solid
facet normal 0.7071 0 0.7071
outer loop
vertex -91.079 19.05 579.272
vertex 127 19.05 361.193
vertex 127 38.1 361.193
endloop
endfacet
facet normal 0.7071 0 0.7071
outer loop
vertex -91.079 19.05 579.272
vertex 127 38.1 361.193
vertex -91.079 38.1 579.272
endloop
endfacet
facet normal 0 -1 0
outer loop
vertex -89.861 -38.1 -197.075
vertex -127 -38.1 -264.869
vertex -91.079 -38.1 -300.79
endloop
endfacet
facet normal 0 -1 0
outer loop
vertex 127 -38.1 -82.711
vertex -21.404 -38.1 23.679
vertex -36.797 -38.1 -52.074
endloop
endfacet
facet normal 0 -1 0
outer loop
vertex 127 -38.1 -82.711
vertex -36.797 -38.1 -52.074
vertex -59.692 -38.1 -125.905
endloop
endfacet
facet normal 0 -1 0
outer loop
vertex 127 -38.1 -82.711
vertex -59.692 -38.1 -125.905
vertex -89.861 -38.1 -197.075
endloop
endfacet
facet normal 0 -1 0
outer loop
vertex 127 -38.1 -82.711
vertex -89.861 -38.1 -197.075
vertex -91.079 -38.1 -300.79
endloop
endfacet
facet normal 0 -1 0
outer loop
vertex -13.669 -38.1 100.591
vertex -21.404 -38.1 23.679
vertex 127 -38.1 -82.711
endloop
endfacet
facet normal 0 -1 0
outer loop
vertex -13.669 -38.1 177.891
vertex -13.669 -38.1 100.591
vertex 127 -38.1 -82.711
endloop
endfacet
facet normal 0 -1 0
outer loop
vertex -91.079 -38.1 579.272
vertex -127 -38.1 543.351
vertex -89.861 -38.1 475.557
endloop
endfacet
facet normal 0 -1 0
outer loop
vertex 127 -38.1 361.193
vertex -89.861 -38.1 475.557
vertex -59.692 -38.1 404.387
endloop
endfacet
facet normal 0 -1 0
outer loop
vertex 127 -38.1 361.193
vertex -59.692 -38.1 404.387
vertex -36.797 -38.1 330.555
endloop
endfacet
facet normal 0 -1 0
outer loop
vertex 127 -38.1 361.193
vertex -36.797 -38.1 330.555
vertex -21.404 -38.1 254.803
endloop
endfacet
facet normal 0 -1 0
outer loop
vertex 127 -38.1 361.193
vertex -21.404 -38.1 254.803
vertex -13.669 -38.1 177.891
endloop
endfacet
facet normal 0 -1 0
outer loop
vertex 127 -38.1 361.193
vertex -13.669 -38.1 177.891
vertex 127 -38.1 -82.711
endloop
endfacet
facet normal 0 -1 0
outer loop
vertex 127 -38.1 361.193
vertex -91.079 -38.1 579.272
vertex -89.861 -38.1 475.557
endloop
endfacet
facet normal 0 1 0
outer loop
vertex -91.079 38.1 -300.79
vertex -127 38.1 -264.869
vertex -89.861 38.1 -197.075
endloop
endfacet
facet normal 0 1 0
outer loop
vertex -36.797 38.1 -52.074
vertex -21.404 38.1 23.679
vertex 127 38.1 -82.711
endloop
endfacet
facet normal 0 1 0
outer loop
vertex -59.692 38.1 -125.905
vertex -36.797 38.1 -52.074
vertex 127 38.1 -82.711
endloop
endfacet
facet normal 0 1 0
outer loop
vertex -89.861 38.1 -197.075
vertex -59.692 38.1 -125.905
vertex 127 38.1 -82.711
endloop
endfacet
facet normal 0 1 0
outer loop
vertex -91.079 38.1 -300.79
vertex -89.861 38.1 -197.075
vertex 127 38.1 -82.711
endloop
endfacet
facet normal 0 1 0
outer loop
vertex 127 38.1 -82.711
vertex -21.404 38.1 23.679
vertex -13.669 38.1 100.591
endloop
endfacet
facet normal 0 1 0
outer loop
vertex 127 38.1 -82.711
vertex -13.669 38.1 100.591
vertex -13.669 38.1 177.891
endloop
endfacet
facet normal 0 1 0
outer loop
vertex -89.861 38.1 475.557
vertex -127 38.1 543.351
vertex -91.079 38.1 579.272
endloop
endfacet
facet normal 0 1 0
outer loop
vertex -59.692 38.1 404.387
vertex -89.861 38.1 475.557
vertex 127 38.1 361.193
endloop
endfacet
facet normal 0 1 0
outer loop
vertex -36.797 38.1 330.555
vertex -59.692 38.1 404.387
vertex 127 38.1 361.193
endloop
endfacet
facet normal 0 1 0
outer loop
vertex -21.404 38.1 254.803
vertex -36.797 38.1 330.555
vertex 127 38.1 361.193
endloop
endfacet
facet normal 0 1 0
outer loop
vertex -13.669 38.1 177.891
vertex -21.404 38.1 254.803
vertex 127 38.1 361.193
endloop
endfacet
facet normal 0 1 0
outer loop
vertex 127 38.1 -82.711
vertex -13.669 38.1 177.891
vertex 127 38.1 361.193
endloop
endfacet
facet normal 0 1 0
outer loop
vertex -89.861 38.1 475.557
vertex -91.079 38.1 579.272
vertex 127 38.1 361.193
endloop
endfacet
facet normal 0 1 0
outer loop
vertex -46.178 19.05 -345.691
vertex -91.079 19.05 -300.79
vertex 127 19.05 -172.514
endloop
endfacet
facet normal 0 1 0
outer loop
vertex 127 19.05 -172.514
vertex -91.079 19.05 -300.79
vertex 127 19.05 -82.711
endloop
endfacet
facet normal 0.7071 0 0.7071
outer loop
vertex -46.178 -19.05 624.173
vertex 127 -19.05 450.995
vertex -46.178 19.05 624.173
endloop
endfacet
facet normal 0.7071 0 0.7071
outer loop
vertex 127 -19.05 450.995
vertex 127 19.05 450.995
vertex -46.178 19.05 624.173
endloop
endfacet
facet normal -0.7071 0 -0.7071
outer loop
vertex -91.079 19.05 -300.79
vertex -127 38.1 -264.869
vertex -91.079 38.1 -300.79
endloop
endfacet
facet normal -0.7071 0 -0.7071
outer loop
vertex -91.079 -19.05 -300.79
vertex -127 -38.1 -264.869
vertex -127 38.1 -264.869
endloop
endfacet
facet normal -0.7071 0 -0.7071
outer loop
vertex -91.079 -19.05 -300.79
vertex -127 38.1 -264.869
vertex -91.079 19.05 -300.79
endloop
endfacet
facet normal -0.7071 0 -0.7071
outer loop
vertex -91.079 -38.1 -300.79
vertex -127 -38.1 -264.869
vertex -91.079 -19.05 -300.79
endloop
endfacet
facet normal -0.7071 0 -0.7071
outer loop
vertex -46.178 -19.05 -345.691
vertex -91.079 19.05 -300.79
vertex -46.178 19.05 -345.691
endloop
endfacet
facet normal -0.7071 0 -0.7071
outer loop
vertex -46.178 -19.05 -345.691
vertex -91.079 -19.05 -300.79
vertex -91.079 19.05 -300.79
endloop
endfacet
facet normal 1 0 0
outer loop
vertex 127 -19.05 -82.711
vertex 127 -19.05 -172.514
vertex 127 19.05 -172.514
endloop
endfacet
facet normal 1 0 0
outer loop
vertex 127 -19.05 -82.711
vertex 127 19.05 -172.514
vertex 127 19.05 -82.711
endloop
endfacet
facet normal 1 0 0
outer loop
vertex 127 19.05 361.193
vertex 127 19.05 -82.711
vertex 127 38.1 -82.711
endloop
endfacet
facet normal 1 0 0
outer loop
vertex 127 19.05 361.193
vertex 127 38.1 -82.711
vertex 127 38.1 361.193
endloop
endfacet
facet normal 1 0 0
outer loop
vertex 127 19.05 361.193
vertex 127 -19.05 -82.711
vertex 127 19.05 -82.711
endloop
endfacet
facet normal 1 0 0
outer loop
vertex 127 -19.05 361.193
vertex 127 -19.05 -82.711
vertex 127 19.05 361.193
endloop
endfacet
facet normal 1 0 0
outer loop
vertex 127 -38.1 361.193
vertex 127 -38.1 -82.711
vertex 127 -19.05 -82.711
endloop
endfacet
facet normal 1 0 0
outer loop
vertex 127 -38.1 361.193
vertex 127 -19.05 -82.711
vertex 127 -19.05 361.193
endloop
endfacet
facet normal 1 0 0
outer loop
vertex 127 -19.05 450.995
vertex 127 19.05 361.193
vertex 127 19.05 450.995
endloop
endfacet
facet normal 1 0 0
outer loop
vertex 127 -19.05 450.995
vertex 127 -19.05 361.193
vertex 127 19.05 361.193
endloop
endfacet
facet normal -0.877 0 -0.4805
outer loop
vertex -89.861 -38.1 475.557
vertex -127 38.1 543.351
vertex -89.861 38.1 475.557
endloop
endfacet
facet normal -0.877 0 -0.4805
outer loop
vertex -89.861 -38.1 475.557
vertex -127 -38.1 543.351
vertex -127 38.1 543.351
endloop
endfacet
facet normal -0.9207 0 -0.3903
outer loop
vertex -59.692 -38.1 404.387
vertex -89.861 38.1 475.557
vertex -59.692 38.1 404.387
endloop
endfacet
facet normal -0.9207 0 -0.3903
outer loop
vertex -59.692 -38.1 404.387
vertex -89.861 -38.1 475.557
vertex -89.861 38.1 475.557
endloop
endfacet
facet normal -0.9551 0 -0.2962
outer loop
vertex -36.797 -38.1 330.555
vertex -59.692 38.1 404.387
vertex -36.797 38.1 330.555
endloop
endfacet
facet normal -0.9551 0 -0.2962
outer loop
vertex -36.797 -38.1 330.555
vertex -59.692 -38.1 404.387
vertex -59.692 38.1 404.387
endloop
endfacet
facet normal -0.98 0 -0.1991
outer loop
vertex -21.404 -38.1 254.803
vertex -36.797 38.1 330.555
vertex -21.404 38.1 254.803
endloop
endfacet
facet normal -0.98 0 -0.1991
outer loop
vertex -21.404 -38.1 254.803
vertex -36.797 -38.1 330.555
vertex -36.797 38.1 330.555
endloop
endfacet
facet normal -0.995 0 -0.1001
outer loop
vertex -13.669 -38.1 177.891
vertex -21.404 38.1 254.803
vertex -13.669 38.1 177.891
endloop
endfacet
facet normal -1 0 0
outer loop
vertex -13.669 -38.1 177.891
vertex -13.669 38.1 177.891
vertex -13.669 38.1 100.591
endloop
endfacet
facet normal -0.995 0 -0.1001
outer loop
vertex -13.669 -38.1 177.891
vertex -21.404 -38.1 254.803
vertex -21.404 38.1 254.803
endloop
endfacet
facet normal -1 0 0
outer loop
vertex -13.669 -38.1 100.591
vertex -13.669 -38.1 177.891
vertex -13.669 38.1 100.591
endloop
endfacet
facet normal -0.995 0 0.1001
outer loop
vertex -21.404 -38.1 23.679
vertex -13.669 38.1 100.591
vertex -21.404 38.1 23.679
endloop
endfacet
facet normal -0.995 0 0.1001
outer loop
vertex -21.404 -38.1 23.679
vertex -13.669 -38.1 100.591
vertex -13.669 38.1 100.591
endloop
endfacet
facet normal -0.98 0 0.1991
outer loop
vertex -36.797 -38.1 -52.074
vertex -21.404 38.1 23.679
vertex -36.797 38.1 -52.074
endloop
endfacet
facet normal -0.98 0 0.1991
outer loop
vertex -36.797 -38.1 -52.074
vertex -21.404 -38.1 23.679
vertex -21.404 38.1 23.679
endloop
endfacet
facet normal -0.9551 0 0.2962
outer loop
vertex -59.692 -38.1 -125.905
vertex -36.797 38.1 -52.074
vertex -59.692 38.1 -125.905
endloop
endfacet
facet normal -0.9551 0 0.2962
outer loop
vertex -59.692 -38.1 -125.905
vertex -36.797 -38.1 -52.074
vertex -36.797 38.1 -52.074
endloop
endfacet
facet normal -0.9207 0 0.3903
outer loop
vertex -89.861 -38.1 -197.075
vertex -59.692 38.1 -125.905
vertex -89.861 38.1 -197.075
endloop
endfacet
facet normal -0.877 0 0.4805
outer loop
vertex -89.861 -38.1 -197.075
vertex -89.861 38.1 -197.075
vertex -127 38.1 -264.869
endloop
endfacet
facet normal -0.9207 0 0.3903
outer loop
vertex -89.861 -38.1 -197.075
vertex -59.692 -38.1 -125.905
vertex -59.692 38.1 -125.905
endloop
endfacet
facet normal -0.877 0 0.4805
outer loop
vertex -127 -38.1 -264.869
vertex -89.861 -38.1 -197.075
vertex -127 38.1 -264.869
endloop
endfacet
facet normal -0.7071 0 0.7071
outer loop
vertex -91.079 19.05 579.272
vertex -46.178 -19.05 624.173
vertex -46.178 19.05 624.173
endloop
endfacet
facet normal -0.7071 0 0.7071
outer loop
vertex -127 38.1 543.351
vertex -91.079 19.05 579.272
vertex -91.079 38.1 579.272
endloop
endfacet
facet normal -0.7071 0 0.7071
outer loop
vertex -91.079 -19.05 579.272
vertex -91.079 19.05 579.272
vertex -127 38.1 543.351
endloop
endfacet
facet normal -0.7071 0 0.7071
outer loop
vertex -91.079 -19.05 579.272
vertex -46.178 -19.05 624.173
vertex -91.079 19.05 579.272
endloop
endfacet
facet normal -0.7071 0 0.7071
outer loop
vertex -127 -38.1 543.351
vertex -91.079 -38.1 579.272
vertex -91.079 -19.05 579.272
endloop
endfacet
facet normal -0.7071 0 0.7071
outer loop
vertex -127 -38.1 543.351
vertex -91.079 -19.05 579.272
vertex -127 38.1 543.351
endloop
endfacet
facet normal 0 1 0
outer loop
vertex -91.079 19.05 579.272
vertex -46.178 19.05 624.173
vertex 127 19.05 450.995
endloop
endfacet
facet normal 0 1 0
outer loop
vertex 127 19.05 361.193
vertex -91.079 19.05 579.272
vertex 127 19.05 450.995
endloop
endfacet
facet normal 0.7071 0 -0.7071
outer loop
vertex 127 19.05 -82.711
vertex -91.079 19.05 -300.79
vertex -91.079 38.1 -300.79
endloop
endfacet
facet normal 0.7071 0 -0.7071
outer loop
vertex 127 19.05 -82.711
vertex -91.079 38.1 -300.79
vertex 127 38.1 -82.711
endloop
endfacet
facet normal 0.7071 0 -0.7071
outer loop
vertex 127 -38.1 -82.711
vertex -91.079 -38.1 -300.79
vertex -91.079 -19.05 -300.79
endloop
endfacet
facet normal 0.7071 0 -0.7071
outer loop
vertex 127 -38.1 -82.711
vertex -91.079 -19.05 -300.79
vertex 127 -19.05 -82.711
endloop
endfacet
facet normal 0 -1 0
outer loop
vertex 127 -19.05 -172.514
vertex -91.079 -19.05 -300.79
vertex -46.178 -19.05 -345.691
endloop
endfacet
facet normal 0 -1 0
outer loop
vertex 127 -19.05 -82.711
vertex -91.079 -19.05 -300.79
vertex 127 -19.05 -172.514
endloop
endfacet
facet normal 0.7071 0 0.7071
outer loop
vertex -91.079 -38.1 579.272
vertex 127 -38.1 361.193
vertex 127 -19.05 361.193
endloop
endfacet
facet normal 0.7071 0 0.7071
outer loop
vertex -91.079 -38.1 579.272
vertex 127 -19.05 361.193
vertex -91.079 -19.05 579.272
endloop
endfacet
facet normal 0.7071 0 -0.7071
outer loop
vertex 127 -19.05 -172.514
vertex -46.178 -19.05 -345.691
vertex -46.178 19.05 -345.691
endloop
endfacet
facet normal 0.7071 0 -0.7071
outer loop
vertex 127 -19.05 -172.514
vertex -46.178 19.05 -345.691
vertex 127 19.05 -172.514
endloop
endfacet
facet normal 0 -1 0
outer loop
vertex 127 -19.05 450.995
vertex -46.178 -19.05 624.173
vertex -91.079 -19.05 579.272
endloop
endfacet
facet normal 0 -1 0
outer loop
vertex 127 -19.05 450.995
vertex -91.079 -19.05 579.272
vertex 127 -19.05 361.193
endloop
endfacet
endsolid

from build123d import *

# Parameters (mm, degrees)
F1_DEPTH = 38.1
F2_DEPTH = 19.05


with BuildPart() as f1:
    # F0 (on Front) → F1 (new body, symmetric)
    with BuildSketch(Plane.XZ):
        with BuildLine():
            Line((127, 289.350815773), (-127, 543.350815773))
            ThreePointArc((-127, 543.350815773), (-12.7, 139.2408841362), (-127, -264.8690475006))
            Line((-127, -264.8690475006), (127, -10.8690475006))
            Line((127, -10.8690475006), (127, 289.350815773))
        make_face()
        Polygon((127, -10.8690475006), (-127, -264.8690475006), (-100.0592316368, -291.8098158638), (127, -64.750584227), align=None)
        Polygon((-100.0592316368, 570.2915841362), (-127, 543.350815773), (127, 289.350815773), (127, 343.2323524994), align=None)
        Polygon((-91.0789755157, 579.2718402573), (-100.0592316368, 570.2915841362), (127, 343.2323524994), (127, 361.1928647416), align=None)
        Polygon((127, -64.750584227), (-100.0592316368, -291.8098158638), (-91.0789755157, -300.7900719849), (127, -82.7110964691), align=None)
    extrude(amount=F1_DEPTH, both=True)

    # F0 (on Front) → F2 (join, symmetric)
    with BuildSketch(Plane.XZ):
        Polygon((127, 361.1928647416), (127, 450.9954259523), (-46.1776949104, 624.1731208626), (-91.0789755157, 579.2718402573), align=None)
        Polygon((127, -82.7110964691), (-91.0789755157, -300.7900719849), (-46.1776949104, -345.6913525902), (127, -172.5136576798), align=None)
    extrude(amount=F2_DEPTH, both=True)


solid = f1.part
